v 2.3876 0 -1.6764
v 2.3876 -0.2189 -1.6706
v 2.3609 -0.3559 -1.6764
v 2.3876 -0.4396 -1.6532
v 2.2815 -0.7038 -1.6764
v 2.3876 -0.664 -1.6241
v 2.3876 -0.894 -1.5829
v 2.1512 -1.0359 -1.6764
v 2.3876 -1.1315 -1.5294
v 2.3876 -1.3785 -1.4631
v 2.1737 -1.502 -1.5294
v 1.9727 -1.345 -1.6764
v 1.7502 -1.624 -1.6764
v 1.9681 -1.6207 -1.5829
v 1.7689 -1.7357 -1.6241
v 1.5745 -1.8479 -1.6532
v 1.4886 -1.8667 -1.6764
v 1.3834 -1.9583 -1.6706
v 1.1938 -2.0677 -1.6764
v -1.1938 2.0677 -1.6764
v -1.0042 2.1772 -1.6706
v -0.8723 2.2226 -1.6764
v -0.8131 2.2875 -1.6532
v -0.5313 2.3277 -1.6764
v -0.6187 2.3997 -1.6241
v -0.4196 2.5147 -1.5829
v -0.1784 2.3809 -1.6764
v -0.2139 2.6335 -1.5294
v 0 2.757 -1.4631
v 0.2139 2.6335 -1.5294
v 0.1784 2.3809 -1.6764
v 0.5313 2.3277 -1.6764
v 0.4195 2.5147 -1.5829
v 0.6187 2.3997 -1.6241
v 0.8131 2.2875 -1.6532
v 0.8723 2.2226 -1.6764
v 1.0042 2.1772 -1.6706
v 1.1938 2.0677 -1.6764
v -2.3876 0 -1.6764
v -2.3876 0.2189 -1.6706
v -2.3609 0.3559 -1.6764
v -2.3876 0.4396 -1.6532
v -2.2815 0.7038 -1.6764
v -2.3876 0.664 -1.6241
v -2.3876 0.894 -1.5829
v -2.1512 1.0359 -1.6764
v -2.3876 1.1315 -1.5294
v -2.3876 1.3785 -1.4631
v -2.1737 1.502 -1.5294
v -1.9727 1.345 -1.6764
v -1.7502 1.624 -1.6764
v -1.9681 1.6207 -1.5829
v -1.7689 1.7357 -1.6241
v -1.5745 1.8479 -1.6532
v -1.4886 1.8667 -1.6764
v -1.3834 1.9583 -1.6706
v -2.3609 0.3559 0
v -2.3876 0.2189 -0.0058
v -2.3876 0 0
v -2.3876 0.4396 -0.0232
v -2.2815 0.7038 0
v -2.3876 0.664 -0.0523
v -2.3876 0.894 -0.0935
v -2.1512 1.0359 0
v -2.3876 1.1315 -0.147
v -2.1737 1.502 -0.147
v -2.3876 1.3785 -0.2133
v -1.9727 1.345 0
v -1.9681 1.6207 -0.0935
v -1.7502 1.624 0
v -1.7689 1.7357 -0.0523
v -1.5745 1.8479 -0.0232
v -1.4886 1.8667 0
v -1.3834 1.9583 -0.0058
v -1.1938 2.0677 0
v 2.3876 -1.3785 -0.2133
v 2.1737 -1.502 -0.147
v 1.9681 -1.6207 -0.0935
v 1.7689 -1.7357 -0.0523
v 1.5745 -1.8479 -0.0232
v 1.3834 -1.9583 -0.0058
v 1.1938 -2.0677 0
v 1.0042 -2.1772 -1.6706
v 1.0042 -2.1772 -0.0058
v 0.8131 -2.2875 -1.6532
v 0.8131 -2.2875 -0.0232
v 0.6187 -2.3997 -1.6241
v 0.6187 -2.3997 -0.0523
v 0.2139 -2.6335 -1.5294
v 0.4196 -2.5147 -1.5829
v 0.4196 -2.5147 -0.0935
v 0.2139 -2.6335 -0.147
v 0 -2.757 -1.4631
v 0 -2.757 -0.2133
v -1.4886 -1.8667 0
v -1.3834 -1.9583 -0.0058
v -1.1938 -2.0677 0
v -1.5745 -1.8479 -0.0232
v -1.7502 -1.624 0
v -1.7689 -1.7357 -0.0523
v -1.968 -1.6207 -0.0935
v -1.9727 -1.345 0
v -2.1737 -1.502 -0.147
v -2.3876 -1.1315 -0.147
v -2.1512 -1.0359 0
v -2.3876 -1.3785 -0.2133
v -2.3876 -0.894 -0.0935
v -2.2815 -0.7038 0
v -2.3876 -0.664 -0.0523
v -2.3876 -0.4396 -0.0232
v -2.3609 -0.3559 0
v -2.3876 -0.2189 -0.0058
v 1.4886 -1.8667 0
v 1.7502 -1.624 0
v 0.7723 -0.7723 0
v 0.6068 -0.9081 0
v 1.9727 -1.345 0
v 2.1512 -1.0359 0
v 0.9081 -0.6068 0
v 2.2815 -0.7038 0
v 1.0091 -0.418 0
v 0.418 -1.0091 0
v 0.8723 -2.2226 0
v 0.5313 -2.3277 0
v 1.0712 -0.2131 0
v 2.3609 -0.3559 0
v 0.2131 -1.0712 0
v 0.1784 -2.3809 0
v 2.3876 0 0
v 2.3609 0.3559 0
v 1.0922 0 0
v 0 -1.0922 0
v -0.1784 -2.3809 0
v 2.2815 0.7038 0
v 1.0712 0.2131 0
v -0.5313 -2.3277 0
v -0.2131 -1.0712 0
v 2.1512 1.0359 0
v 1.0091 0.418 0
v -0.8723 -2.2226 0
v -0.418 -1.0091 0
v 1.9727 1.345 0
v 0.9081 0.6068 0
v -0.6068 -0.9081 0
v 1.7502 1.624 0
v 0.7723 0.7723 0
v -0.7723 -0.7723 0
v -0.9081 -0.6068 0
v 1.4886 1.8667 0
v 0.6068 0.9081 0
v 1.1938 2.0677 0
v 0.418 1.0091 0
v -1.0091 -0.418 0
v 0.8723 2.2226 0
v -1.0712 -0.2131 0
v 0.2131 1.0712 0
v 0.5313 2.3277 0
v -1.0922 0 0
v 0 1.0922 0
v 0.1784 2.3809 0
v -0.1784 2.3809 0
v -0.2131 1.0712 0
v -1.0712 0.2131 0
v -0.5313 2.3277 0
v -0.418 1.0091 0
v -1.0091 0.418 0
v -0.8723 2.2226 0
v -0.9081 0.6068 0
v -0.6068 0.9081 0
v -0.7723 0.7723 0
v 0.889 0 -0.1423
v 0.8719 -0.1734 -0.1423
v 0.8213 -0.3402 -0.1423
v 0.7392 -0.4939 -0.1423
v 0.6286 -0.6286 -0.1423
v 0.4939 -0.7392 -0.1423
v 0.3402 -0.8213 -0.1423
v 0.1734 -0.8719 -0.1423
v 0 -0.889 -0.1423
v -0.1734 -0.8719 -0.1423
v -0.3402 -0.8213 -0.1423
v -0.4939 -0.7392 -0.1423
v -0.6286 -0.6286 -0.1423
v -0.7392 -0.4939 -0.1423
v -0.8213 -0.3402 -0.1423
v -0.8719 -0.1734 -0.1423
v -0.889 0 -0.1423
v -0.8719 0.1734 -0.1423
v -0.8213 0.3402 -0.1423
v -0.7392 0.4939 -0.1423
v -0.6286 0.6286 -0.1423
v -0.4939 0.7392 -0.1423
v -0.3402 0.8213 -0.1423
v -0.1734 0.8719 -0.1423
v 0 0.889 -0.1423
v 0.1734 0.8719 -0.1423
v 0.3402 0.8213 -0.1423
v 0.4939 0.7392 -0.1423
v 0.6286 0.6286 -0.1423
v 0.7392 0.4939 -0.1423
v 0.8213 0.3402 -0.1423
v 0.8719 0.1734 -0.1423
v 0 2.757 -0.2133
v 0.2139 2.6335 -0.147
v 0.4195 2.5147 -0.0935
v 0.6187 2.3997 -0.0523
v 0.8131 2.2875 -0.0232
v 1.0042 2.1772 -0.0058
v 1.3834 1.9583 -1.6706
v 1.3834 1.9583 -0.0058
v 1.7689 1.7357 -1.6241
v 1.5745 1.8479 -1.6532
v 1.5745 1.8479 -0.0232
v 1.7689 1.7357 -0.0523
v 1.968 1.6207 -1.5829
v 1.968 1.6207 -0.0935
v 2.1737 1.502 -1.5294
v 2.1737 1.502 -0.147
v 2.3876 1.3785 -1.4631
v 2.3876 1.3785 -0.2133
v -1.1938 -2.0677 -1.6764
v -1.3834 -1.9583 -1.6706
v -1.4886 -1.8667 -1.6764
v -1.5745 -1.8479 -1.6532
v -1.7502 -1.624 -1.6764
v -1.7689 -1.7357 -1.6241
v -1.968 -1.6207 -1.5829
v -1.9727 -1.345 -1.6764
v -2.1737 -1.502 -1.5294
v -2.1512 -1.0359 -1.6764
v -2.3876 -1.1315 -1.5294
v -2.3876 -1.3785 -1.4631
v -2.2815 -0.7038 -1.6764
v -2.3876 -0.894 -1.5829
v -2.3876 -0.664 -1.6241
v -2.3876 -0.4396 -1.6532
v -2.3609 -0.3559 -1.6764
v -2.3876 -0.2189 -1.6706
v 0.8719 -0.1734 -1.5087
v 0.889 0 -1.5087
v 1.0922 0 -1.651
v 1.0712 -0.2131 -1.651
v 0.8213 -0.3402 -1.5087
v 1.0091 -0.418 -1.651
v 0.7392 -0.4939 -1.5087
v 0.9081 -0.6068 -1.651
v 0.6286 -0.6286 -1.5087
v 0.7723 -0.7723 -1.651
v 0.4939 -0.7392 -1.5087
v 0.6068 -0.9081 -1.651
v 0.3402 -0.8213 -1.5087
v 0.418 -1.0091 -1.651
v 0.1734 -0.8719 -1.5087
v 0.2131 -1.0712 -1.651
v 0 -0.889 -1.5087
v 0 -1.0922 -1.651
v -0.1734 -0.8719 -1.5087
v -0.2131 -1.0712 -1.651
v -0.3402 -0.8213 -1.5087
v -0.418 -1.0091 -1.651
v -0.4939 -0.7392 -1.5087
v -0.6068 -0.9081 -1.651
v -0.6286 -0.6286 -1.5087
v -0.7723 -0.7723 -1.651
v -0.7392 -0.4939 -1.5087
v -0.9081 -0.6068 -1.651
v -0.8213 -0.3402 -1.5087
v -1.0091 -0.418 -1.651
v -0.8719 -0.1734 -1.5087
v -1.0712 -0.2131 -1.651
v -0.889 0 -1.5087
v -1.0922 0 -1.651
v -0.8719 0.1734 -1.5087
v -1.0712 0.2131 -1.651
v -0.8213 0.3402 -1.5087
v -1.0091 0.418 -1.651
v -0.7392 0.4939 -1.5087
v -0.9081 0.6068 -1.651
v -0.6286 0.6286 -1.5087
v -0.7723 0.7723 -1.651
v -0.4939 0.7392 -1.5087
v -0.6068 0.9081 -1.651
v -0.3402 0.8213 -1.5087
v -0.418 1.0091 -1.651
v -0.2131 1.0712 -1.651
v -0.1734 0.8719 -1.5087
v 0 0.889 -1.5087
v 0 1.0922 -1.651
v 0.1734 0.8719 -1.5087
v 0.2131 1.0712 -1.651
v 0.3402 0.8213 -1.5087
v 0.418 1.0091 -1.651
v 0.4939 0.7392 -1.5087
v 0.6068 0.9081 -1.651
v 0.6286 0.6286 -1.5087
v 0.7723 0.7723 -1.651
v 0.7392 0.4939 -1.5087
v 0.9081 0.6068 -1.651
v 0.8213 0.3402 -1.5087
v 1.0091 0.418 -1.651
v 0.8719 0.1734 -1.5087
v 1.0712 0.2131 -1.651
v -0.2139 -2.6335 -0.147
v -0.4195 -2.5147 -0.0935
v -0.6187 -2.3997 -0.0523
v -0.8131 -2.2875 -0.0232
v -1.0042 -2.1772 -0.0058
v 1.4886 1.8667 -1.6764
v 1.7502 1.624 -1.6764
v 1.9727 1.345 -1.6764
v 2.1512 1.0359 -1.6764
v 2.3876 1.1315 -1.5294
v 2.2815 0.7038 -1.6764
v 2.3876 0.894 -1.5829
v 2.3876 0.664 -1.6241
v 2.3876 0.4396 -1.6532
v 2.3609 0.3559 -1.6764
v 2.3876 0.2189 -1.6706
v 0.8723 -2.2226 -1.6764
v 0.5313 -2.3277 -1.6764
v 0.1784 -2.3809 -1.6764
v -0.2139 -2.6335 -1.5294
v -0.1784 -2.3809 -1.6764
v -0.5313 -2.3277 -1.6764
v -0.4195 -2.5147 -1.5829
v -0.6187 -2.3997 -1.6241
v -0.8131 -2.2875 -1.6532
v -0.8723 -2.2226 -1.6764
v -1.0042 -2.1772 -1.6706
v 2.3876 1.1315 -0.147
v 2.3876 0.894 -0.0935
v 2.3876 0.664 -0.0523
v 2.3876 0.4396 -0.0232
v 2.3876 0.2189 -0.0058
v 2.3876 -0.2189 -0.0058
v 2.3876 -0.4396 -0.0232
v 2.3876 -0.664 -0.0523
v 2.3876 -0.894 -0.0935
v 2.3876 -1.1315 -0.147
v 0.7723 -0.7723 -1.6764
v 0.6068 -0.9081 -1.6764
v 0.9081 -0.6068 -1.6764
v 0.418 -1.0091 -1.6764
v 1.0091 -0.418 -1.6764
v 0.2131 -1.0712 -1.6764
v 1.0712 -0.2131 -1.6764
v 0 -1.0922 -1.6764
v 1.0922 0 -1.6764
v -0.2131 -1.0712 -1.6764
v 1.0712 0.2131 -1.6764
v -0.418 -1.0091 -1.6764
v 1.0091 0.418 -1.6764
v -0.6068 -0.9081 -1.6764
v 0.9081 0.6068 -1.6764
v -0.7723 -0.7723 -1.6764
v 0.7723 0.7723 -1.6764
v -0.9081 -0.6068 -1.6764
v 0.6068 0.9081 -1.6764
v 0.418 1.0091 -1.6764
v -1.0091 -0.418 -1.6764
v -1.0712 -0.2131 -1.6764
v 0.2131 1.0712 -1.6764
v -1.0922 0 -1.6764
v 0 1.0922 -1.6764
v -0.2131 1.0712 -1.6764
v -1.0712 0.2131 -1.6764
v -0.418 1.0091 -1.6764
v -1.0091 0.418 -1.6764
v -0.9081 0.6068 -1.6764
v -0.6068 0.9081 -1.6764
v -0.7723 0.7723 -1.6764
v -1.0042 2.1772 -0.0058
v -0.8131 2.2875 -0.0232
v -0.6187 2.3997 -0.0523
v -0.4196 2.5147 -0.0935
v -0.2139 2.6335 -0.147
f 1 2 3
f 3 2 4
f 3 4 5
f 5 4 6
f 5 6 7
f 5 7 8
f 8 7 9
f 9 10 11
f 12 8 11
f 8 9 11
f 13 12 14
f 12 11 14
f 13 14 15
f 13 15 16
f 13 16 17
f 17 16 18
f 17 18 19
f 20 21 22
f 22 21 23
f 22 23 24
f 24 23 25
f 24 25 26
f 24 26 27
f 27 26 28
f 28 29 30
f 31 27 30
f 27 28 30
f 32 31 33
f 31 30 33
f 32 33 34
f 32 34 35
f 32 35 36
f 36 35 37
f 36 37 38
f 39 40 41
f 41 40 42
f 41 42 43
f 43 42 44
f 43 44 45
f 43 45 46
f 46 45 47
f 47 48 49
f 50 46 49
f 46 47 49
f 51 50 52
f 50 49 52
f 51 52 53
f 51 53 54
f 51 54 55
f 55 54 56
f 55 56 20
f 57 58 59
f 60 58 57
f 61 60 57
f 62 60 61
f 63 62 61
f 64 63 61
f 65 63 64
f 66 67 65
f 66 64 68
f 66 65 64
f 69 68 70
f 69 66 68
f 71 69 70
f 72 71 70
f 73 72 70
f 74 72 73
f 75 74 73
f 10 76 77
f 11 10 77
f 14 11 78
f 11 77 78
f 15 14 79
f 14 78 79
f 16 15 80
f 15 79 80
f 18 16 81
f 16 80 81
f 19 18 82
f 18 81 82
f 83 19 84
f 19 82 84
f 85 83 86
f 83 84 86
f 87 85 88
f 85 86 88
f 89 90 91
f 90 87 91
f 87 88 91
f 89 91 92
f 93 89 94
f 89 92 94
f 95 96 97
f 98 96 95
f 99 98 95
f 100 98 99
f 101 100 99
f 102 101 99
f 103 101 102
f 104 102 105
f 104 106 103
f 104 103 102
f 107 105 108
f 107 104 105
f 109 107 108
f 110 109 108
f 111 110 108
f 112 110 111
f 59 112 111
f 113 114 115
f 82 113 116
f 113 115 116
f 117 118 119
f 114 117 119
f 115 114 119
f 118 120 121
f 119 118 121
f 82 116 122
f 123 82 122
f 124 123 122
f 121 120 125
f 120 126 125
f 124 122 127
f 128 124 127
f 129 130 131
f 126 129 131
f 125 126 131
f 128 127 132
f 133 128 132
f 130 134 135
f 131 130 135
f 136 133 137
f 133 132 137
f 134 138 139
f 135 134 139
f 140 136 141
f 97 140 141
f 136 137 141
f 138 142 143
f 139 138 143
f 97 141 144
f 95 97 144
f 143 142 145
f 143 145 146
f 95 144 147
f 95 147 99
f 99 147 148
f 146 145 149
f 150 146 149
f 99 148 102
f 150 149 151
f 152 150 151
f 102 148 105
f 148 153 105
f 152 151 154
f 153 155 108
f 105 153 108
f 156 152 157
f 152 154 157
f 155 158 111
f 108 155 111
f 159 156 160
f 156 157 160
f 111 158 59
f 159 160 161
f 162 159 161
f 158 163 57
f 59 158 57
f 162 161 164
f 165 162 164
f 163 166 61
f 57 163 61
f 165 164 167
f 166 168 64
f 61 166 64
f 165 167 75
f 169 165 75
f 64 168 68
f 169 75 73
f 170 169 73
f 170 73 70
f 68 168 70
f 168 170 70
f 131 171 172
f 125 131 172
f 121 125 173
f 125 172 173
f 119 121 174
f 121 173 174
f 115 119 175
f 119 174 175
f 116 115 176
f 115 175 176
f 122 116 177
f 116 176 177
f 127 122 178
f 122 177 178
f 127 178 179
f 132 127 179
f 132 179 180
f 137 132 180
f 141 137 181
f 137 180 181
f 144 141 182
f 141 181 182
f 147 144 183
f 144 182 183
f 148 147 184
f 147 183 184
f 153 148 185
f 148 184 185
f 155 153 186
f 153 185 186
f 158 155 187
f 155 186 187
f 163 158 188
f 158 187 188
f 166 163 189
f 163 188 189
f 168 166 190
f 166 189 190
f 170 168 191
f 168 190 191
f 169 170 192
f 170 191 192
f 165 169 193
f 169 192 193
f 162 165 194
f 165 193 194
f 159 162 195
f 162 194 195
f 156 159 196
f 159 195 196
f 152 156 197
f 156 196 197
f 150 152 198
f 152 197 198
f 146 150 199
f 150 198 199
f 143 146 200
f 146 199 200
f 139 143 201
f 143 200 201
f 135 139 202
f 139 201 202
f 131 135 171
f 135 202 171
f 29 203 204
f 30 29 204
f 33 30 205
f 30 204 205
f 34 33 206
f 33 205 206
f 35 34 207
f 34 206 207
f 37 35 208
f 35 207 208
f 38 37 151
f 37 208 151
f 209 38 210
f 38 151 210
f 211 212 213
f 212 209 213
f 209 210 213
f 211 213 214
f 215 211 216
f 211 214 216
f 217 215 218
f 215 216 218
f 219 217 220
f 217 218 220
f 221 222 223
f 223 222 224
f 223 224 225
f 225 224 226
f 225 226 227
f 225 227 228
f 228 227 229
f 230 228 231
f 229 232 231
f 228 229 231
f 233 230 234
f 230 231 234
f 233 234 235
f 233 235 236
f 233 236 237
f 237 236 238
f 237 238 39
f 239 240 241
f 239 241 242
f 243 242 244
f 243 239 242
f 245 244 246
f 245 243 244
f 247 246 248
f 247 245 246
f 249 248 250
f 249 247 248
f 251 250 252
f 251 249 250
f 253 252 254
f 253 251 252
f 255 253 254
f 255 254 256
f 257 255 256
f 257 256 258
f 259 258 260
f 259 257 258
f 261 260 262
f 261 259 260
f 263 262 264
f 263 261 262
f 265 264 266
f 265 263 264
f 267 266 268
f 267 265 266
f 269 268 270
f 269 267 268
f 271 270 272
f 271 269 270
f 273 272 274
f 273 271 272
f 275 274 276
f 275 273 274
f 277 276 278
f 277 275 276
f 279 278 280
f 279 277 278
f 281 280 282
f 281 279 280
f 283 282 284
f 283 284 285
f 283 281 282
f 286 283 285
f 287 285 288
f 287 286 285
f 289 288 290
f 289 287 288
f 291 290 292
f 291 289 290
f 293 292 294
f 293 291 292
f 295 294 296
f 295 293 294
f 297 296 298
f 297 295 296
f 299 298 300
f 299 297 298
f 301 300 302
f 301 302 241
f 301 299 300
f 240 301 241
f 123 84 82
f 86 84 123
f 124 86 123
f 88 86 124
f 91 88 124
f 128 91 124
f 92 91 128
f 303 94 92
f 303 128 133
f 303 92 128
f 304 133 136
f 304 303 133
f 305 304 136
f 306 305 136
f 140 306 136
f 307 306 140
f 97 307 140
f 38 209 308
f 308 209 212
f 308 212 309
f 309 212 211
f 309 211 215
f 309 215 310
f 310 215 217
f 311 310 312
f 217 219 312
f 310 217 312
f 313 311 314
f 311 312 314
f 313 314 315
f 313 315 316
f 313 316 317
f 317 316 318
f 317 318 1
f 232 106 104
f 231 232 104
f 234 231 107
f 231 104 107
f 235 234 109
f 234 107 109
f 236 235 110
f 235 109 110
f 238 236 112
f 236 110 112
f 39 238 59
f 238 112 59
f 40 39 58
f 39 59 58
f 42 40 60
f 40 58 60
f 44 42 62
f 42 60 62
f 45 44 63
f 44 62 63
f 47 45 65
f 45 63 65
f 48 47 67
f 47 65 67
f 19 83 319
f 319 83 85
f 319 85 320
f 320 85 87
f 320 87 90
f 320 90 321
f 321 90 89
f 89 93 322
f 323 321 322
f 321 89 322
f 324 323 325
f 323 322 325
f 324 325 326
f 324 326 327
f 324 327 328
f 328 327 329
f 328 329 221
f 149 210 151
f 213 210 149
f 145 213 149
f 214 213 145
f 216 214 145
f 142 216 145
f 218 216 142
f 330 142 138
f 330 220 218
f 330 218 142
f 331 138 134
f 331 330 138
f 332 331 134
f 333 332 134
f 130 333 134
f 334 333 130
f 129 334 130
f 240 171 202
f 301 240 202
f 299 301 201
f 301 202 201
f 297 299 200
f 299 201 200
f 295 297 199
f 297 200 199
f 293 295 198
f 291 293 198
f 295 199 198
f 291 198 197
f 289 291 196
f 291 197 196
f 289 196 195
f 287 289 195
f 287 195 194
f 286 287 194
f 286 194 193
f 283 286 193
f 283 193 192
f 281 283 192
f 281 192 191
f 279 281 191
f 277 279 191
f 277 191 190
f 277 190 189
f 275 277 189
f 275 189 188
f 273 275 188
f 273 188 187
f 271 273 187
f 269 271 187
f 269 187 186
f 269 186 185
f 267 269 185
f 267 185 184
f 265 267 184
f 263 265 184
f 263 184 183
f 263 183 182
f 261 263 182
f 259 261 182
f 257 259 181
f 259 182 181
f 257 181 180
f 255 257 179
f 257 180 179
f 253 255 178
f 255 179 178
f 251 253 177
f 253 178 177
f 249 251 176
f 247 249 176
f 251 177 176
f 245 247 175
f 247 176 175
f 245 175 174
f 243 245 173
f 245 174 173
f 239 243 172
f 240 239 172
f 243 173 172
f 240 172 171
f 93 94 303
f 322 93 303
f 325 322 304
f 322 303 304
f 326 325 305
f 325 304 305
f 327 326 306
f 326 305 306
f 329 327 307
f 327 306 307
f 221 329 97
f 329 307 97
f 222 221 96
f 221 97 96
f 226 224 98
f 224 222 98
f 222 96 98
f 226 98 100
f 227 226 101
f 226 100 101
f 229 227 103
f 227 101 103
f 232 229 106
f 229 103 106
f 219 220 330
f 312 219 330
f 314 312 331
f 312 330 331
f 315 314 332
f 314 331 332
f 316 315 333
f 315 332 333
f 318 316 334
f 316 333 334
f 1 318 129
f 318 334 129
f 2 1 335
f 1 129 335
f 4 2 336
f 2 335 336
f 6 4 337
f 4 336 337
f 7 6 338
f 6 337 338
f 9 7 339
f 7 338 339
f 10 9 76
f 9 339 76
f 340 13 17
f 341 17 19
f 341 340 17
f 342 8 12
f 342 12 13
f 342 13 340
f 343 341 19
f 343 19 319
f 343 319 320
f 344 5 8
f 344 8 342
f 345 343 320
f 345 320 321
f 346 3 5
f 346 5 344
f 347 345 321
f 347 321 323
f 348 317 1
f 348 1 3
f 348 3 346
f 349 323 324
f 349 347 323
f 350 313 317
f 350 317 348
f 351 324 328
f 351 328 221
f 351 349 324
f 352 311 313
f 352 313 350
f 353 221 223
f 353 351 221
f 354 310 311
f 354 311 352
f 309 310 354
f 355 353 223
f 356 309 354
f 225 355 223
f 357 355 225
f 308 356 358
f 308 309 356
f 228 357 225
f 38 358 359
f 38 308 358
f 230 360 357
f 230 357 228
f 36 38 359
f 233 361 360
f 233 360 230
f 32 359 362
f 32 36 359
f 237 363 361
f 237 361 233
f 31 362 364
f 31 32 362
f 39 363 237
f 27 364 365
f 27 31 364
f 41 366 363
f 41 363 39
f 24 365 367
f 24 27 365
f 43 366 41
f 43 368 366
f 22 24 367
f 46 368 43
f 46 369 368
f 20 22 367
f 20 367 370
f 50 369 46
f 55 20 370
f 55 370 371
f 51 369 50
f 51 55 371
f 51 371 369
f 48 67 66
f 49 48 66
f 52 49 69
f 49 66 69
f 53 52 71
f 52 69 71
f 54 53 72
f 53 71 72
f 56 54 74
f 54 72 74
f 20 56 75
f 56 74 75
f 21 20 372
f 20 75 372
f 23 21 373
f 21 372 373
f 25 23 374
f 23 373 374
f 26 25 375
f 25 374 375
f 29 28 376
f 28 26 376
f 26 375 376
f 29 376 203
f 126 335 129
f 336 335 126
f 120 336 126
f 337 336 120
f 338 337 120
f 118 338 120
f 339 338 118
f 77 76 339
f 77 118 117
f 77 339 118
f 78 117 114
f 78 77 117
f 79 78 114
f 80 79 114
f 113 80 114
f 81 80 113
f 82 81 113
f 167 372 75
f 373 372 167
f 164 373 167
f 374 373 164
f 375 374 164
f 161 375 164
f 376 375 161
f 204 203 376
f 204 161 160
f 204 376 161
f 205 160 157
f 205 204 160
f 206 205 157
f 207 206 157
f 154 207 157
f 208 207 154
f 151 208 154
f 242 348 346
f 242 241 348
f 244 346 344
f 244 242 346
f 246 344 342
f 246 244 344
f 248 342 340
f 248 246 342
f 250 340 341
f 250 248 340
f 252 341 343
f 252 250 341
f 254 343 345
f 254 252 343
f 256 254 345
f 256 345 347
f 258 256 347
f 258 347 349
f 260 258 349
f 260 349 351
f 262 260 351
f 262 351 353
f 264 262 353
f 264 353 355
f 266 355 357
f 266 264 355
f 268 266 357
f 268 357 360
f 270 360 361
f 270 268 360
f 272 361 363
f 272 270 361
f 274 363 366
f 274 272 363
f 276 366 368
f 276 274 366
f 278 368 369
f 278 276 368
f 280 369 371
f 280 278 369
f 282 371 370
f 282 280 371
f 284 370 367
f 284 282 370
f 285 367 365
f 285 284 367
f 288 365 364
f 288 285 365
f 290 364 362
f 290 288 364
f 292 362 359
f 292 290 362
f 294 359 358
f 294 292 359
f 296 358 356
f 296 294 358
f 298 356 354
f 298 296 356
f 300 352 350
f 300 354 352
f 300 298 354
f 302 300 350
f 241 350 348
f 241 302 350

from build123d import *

# Parameters (mm, degrees)
BASENUTSKE_R  = 0.889
BASENUT_DEPTH = 1.6764


with BuildPart() as part:
    # BaseNutSke → BaseNut (new body)
    with BuildSketch(Plane.XY):
        Polygon((2.3876, 1.378481503), (2.3876, -1.378481503), (0, -2.756963005), (-2.3876, -1.378481503), (-2.3876, 1.378481503), (0, 2.756963005), align=None)
        Circle(BASENUTSKE_R, mode=Mode.SUBTRACT)
    extrude(amount=-BASENUT_DEPTH)

    # Sketch3 → Double-Chamfer (revolve, cut)
    with BuildSketch(Plane(origin=(0, 0, 0), x_dir=(0, 0, -1), z_dir=(1, 0, 0))):
        Polygon((1.6764, 2.3876), (1.463148169, 2.756963005), (1.463148169, 15.456963005), (14.3764, 15.456963005), (14.3764, 2.3876), align=None)
        Polygon((0.213251831, 15.456963005), (-12.7, 15.456963005), (-12.7, 2.3876), (0, 2.3876), (0.213251831, 2.756963005), align=None)
    revolve(axis=Axis((0, 0, 0), (0, 0, -1)), mode=Mode.SUBTRACT)

    # EndChamferSketch → EndChamfer (revolve, cut)
    with BuildSketch(Plane(origin=(0, 0, 0), x_dir=(0, 0, -1), z_dir=(1, 0, 0)), mode=Mode.PRIVATE) as endchamfer_sk:
        Polygon((1.651, 1.0922), (1.494489611, 0.86868), (1.7018, 0.86868), (1.7018, 1.0922), align=None)
        Polygon((-0.0508, 1.0922), (0, 1.0922), (0.156510389, 0.86868), (-0.0508, 0.86868), align=None)
    revolve(endchamfer_sk.sketch.rotate(Axis((0, 0, -25.037505729), (0, 0, -1)), 90), axis=Axis((0, 0, -25.037505729), (0, 0, -1)), mode=Mode.SUBTRACT)


solid = part.part
